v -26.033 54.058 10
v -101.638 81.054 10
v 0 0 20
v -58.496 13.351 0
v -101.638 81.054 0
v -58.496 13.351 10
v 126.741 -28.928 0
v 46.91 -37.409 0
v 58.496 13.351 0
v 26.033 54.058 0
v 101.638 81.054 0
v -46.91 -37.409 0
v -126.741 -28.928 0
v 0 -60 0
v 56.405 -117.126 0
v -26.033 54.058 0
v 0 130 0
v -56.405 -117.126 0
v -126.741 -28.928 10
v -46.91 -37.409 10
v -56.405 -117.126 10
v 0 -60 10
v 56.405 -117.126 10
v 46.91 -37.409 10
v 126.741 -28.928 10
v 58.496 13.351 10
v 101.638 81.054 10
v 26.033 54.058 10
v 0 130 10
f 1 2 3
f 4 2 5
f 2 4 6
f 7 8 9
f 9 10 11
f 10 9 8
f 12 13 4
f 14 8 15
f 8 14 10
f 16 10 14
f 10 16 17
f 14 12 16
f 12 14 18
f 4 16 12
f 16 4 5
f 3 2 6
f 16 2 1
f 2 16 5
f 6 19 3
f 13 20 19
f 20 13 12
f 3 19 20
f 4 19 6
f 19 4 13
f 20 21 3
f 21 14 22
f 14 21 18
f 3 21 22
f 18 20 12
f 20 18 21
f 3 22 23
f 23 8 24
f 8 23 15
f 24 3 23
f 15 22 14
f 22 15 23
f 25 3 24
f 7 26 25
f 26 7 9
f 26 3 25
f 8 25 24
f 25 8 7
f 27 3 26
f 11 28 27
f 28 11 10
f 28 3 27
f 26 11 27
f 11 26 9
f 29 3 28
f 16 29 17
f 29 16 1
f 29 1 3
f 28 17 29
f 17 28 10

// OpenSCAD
Outer_Radius = 130;
Inner_Radius = 60;
Inner_Heighth=20;
Outer_Heighth=10;

Number_of_Rays=7;

union(){
    for(i= [1:Number_of_Rays])
    {
        rotate([0,0,i*(360/Number_of_Rays)]) zacken();
    }
}

module zacken()
{
    polyhedron(
        points = [  [ 0, 0, 0], [0,0,Inner_Heighth], [0, Outer_Radius, Outer_Heighth], [0, Outer_Radius, 0],
                    [Inner_Radius*sin(360/(2*Number_of_Rays)), Inner_Radius*cos(360/(2*Number_of_Rays)),Outer_Heighth],[-Inner_Radius*sin(360/(2*Number_of_Rays)), Inner_Radius*cos(360/(2*Number_of_Rays)),Outer_Heighth],
                    [Inner_Radius*sin(360/(2*Number_of_Rays)), Inner_Radius*cos(360/(2*Number_of_Rays)),0],[-Inner_Radius*sin(360/(2*Number_of_Rays)), Inner_Radius*cos(360/(2*Number_of_Rays)),0]],
        faces = [[1,2,4],[1,5,2],[0,6,3],[0,3,7],[6,4,3],[4,2,3],[7,3,5],[5,3,2],
                    [0,1,4],[0,5,1],[0,7,5],[0,4,6]]
    
    );
}
